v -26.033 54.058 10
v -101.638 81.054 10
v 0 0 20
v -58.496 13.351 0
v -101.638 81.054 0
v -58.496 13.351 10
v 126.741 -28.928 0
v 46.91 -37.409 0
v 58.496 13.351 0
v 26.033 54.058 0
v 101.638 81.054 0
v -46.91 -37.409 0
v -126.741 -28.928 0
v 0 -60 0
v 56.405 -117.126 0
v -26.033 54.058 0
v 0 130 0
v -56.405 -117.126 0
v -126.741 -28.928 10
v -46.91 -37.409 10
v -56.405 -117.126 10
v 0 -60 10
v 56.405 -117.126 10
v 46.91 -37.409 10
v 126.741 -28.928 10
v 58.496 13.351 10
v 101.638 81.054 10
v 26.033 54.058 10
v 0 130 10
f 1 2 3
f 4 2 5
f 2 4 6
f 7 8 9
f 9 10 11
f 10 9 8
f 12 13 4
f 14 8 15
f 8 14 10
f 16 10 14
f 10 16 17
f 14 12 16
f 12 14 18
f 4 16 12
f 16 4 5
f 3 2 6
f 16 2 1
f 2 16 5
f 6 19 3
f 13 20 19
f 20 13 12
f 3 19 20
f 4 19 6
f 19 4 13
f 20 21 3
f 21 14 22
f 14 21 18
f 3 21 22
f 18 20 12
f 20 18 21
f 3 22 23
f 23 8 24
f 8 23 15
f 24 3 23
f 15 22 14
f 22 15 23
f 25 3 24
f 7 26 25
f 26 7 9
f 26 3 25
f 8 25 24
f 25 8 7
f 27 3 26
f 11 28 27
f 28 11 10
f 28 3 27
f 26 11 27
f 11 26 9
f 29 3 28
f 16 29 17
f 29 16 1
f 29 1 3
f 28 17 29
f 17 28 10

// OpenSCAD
Outer_Radius = 130;
Inner_Radius = 60;
Inner_Heighth=20;
Outer_Heighth=10;

Number_of_Rays=7;

union(){
    for(i= [1:Number_of_Rays])
    {
        rotate([0,0,i*(360/Number_of_Rays)]) zacken();
    }
}

module zacken()
{
    polyhedron(
        points = [  [ 0, 0, 0], [0,0,Inner_Heighth], [0, Outer_Radius, Outer_Heighth], [0, Outer_Radius, 0],
                    [Inner_Radius*sin(360/(2*Number_of_Rays)), Inner_Radius*cos(360/(2*Number_of_Rays)),Outer_Heighth],[-Inner_Radius*sin(360/(2*Number_of_Rays)), Inner_Radius*cos(360/(2*Number_of_Rays)),Outer_Heighth],
                    [Inner_Radius*sin(360/(2*Number_of_Rays)), Inner_Radius*cos(360/(2*Number_of_Rays)),0],[-Inner_Radius*sin(360/(2*Number_of_Rays)), Inner_Radius*cos(360/(2*Number_of_Rays)),0]],
        faces = [[1,2,4],[1,5,2],[0,6,3],[0,3,7],[6,4,3],[4,2,3],[7,3,5],[5,3,2],
                    [0,1,4],[0,5,1],[0,7,5],[0,4,6]]
    
    );
}
